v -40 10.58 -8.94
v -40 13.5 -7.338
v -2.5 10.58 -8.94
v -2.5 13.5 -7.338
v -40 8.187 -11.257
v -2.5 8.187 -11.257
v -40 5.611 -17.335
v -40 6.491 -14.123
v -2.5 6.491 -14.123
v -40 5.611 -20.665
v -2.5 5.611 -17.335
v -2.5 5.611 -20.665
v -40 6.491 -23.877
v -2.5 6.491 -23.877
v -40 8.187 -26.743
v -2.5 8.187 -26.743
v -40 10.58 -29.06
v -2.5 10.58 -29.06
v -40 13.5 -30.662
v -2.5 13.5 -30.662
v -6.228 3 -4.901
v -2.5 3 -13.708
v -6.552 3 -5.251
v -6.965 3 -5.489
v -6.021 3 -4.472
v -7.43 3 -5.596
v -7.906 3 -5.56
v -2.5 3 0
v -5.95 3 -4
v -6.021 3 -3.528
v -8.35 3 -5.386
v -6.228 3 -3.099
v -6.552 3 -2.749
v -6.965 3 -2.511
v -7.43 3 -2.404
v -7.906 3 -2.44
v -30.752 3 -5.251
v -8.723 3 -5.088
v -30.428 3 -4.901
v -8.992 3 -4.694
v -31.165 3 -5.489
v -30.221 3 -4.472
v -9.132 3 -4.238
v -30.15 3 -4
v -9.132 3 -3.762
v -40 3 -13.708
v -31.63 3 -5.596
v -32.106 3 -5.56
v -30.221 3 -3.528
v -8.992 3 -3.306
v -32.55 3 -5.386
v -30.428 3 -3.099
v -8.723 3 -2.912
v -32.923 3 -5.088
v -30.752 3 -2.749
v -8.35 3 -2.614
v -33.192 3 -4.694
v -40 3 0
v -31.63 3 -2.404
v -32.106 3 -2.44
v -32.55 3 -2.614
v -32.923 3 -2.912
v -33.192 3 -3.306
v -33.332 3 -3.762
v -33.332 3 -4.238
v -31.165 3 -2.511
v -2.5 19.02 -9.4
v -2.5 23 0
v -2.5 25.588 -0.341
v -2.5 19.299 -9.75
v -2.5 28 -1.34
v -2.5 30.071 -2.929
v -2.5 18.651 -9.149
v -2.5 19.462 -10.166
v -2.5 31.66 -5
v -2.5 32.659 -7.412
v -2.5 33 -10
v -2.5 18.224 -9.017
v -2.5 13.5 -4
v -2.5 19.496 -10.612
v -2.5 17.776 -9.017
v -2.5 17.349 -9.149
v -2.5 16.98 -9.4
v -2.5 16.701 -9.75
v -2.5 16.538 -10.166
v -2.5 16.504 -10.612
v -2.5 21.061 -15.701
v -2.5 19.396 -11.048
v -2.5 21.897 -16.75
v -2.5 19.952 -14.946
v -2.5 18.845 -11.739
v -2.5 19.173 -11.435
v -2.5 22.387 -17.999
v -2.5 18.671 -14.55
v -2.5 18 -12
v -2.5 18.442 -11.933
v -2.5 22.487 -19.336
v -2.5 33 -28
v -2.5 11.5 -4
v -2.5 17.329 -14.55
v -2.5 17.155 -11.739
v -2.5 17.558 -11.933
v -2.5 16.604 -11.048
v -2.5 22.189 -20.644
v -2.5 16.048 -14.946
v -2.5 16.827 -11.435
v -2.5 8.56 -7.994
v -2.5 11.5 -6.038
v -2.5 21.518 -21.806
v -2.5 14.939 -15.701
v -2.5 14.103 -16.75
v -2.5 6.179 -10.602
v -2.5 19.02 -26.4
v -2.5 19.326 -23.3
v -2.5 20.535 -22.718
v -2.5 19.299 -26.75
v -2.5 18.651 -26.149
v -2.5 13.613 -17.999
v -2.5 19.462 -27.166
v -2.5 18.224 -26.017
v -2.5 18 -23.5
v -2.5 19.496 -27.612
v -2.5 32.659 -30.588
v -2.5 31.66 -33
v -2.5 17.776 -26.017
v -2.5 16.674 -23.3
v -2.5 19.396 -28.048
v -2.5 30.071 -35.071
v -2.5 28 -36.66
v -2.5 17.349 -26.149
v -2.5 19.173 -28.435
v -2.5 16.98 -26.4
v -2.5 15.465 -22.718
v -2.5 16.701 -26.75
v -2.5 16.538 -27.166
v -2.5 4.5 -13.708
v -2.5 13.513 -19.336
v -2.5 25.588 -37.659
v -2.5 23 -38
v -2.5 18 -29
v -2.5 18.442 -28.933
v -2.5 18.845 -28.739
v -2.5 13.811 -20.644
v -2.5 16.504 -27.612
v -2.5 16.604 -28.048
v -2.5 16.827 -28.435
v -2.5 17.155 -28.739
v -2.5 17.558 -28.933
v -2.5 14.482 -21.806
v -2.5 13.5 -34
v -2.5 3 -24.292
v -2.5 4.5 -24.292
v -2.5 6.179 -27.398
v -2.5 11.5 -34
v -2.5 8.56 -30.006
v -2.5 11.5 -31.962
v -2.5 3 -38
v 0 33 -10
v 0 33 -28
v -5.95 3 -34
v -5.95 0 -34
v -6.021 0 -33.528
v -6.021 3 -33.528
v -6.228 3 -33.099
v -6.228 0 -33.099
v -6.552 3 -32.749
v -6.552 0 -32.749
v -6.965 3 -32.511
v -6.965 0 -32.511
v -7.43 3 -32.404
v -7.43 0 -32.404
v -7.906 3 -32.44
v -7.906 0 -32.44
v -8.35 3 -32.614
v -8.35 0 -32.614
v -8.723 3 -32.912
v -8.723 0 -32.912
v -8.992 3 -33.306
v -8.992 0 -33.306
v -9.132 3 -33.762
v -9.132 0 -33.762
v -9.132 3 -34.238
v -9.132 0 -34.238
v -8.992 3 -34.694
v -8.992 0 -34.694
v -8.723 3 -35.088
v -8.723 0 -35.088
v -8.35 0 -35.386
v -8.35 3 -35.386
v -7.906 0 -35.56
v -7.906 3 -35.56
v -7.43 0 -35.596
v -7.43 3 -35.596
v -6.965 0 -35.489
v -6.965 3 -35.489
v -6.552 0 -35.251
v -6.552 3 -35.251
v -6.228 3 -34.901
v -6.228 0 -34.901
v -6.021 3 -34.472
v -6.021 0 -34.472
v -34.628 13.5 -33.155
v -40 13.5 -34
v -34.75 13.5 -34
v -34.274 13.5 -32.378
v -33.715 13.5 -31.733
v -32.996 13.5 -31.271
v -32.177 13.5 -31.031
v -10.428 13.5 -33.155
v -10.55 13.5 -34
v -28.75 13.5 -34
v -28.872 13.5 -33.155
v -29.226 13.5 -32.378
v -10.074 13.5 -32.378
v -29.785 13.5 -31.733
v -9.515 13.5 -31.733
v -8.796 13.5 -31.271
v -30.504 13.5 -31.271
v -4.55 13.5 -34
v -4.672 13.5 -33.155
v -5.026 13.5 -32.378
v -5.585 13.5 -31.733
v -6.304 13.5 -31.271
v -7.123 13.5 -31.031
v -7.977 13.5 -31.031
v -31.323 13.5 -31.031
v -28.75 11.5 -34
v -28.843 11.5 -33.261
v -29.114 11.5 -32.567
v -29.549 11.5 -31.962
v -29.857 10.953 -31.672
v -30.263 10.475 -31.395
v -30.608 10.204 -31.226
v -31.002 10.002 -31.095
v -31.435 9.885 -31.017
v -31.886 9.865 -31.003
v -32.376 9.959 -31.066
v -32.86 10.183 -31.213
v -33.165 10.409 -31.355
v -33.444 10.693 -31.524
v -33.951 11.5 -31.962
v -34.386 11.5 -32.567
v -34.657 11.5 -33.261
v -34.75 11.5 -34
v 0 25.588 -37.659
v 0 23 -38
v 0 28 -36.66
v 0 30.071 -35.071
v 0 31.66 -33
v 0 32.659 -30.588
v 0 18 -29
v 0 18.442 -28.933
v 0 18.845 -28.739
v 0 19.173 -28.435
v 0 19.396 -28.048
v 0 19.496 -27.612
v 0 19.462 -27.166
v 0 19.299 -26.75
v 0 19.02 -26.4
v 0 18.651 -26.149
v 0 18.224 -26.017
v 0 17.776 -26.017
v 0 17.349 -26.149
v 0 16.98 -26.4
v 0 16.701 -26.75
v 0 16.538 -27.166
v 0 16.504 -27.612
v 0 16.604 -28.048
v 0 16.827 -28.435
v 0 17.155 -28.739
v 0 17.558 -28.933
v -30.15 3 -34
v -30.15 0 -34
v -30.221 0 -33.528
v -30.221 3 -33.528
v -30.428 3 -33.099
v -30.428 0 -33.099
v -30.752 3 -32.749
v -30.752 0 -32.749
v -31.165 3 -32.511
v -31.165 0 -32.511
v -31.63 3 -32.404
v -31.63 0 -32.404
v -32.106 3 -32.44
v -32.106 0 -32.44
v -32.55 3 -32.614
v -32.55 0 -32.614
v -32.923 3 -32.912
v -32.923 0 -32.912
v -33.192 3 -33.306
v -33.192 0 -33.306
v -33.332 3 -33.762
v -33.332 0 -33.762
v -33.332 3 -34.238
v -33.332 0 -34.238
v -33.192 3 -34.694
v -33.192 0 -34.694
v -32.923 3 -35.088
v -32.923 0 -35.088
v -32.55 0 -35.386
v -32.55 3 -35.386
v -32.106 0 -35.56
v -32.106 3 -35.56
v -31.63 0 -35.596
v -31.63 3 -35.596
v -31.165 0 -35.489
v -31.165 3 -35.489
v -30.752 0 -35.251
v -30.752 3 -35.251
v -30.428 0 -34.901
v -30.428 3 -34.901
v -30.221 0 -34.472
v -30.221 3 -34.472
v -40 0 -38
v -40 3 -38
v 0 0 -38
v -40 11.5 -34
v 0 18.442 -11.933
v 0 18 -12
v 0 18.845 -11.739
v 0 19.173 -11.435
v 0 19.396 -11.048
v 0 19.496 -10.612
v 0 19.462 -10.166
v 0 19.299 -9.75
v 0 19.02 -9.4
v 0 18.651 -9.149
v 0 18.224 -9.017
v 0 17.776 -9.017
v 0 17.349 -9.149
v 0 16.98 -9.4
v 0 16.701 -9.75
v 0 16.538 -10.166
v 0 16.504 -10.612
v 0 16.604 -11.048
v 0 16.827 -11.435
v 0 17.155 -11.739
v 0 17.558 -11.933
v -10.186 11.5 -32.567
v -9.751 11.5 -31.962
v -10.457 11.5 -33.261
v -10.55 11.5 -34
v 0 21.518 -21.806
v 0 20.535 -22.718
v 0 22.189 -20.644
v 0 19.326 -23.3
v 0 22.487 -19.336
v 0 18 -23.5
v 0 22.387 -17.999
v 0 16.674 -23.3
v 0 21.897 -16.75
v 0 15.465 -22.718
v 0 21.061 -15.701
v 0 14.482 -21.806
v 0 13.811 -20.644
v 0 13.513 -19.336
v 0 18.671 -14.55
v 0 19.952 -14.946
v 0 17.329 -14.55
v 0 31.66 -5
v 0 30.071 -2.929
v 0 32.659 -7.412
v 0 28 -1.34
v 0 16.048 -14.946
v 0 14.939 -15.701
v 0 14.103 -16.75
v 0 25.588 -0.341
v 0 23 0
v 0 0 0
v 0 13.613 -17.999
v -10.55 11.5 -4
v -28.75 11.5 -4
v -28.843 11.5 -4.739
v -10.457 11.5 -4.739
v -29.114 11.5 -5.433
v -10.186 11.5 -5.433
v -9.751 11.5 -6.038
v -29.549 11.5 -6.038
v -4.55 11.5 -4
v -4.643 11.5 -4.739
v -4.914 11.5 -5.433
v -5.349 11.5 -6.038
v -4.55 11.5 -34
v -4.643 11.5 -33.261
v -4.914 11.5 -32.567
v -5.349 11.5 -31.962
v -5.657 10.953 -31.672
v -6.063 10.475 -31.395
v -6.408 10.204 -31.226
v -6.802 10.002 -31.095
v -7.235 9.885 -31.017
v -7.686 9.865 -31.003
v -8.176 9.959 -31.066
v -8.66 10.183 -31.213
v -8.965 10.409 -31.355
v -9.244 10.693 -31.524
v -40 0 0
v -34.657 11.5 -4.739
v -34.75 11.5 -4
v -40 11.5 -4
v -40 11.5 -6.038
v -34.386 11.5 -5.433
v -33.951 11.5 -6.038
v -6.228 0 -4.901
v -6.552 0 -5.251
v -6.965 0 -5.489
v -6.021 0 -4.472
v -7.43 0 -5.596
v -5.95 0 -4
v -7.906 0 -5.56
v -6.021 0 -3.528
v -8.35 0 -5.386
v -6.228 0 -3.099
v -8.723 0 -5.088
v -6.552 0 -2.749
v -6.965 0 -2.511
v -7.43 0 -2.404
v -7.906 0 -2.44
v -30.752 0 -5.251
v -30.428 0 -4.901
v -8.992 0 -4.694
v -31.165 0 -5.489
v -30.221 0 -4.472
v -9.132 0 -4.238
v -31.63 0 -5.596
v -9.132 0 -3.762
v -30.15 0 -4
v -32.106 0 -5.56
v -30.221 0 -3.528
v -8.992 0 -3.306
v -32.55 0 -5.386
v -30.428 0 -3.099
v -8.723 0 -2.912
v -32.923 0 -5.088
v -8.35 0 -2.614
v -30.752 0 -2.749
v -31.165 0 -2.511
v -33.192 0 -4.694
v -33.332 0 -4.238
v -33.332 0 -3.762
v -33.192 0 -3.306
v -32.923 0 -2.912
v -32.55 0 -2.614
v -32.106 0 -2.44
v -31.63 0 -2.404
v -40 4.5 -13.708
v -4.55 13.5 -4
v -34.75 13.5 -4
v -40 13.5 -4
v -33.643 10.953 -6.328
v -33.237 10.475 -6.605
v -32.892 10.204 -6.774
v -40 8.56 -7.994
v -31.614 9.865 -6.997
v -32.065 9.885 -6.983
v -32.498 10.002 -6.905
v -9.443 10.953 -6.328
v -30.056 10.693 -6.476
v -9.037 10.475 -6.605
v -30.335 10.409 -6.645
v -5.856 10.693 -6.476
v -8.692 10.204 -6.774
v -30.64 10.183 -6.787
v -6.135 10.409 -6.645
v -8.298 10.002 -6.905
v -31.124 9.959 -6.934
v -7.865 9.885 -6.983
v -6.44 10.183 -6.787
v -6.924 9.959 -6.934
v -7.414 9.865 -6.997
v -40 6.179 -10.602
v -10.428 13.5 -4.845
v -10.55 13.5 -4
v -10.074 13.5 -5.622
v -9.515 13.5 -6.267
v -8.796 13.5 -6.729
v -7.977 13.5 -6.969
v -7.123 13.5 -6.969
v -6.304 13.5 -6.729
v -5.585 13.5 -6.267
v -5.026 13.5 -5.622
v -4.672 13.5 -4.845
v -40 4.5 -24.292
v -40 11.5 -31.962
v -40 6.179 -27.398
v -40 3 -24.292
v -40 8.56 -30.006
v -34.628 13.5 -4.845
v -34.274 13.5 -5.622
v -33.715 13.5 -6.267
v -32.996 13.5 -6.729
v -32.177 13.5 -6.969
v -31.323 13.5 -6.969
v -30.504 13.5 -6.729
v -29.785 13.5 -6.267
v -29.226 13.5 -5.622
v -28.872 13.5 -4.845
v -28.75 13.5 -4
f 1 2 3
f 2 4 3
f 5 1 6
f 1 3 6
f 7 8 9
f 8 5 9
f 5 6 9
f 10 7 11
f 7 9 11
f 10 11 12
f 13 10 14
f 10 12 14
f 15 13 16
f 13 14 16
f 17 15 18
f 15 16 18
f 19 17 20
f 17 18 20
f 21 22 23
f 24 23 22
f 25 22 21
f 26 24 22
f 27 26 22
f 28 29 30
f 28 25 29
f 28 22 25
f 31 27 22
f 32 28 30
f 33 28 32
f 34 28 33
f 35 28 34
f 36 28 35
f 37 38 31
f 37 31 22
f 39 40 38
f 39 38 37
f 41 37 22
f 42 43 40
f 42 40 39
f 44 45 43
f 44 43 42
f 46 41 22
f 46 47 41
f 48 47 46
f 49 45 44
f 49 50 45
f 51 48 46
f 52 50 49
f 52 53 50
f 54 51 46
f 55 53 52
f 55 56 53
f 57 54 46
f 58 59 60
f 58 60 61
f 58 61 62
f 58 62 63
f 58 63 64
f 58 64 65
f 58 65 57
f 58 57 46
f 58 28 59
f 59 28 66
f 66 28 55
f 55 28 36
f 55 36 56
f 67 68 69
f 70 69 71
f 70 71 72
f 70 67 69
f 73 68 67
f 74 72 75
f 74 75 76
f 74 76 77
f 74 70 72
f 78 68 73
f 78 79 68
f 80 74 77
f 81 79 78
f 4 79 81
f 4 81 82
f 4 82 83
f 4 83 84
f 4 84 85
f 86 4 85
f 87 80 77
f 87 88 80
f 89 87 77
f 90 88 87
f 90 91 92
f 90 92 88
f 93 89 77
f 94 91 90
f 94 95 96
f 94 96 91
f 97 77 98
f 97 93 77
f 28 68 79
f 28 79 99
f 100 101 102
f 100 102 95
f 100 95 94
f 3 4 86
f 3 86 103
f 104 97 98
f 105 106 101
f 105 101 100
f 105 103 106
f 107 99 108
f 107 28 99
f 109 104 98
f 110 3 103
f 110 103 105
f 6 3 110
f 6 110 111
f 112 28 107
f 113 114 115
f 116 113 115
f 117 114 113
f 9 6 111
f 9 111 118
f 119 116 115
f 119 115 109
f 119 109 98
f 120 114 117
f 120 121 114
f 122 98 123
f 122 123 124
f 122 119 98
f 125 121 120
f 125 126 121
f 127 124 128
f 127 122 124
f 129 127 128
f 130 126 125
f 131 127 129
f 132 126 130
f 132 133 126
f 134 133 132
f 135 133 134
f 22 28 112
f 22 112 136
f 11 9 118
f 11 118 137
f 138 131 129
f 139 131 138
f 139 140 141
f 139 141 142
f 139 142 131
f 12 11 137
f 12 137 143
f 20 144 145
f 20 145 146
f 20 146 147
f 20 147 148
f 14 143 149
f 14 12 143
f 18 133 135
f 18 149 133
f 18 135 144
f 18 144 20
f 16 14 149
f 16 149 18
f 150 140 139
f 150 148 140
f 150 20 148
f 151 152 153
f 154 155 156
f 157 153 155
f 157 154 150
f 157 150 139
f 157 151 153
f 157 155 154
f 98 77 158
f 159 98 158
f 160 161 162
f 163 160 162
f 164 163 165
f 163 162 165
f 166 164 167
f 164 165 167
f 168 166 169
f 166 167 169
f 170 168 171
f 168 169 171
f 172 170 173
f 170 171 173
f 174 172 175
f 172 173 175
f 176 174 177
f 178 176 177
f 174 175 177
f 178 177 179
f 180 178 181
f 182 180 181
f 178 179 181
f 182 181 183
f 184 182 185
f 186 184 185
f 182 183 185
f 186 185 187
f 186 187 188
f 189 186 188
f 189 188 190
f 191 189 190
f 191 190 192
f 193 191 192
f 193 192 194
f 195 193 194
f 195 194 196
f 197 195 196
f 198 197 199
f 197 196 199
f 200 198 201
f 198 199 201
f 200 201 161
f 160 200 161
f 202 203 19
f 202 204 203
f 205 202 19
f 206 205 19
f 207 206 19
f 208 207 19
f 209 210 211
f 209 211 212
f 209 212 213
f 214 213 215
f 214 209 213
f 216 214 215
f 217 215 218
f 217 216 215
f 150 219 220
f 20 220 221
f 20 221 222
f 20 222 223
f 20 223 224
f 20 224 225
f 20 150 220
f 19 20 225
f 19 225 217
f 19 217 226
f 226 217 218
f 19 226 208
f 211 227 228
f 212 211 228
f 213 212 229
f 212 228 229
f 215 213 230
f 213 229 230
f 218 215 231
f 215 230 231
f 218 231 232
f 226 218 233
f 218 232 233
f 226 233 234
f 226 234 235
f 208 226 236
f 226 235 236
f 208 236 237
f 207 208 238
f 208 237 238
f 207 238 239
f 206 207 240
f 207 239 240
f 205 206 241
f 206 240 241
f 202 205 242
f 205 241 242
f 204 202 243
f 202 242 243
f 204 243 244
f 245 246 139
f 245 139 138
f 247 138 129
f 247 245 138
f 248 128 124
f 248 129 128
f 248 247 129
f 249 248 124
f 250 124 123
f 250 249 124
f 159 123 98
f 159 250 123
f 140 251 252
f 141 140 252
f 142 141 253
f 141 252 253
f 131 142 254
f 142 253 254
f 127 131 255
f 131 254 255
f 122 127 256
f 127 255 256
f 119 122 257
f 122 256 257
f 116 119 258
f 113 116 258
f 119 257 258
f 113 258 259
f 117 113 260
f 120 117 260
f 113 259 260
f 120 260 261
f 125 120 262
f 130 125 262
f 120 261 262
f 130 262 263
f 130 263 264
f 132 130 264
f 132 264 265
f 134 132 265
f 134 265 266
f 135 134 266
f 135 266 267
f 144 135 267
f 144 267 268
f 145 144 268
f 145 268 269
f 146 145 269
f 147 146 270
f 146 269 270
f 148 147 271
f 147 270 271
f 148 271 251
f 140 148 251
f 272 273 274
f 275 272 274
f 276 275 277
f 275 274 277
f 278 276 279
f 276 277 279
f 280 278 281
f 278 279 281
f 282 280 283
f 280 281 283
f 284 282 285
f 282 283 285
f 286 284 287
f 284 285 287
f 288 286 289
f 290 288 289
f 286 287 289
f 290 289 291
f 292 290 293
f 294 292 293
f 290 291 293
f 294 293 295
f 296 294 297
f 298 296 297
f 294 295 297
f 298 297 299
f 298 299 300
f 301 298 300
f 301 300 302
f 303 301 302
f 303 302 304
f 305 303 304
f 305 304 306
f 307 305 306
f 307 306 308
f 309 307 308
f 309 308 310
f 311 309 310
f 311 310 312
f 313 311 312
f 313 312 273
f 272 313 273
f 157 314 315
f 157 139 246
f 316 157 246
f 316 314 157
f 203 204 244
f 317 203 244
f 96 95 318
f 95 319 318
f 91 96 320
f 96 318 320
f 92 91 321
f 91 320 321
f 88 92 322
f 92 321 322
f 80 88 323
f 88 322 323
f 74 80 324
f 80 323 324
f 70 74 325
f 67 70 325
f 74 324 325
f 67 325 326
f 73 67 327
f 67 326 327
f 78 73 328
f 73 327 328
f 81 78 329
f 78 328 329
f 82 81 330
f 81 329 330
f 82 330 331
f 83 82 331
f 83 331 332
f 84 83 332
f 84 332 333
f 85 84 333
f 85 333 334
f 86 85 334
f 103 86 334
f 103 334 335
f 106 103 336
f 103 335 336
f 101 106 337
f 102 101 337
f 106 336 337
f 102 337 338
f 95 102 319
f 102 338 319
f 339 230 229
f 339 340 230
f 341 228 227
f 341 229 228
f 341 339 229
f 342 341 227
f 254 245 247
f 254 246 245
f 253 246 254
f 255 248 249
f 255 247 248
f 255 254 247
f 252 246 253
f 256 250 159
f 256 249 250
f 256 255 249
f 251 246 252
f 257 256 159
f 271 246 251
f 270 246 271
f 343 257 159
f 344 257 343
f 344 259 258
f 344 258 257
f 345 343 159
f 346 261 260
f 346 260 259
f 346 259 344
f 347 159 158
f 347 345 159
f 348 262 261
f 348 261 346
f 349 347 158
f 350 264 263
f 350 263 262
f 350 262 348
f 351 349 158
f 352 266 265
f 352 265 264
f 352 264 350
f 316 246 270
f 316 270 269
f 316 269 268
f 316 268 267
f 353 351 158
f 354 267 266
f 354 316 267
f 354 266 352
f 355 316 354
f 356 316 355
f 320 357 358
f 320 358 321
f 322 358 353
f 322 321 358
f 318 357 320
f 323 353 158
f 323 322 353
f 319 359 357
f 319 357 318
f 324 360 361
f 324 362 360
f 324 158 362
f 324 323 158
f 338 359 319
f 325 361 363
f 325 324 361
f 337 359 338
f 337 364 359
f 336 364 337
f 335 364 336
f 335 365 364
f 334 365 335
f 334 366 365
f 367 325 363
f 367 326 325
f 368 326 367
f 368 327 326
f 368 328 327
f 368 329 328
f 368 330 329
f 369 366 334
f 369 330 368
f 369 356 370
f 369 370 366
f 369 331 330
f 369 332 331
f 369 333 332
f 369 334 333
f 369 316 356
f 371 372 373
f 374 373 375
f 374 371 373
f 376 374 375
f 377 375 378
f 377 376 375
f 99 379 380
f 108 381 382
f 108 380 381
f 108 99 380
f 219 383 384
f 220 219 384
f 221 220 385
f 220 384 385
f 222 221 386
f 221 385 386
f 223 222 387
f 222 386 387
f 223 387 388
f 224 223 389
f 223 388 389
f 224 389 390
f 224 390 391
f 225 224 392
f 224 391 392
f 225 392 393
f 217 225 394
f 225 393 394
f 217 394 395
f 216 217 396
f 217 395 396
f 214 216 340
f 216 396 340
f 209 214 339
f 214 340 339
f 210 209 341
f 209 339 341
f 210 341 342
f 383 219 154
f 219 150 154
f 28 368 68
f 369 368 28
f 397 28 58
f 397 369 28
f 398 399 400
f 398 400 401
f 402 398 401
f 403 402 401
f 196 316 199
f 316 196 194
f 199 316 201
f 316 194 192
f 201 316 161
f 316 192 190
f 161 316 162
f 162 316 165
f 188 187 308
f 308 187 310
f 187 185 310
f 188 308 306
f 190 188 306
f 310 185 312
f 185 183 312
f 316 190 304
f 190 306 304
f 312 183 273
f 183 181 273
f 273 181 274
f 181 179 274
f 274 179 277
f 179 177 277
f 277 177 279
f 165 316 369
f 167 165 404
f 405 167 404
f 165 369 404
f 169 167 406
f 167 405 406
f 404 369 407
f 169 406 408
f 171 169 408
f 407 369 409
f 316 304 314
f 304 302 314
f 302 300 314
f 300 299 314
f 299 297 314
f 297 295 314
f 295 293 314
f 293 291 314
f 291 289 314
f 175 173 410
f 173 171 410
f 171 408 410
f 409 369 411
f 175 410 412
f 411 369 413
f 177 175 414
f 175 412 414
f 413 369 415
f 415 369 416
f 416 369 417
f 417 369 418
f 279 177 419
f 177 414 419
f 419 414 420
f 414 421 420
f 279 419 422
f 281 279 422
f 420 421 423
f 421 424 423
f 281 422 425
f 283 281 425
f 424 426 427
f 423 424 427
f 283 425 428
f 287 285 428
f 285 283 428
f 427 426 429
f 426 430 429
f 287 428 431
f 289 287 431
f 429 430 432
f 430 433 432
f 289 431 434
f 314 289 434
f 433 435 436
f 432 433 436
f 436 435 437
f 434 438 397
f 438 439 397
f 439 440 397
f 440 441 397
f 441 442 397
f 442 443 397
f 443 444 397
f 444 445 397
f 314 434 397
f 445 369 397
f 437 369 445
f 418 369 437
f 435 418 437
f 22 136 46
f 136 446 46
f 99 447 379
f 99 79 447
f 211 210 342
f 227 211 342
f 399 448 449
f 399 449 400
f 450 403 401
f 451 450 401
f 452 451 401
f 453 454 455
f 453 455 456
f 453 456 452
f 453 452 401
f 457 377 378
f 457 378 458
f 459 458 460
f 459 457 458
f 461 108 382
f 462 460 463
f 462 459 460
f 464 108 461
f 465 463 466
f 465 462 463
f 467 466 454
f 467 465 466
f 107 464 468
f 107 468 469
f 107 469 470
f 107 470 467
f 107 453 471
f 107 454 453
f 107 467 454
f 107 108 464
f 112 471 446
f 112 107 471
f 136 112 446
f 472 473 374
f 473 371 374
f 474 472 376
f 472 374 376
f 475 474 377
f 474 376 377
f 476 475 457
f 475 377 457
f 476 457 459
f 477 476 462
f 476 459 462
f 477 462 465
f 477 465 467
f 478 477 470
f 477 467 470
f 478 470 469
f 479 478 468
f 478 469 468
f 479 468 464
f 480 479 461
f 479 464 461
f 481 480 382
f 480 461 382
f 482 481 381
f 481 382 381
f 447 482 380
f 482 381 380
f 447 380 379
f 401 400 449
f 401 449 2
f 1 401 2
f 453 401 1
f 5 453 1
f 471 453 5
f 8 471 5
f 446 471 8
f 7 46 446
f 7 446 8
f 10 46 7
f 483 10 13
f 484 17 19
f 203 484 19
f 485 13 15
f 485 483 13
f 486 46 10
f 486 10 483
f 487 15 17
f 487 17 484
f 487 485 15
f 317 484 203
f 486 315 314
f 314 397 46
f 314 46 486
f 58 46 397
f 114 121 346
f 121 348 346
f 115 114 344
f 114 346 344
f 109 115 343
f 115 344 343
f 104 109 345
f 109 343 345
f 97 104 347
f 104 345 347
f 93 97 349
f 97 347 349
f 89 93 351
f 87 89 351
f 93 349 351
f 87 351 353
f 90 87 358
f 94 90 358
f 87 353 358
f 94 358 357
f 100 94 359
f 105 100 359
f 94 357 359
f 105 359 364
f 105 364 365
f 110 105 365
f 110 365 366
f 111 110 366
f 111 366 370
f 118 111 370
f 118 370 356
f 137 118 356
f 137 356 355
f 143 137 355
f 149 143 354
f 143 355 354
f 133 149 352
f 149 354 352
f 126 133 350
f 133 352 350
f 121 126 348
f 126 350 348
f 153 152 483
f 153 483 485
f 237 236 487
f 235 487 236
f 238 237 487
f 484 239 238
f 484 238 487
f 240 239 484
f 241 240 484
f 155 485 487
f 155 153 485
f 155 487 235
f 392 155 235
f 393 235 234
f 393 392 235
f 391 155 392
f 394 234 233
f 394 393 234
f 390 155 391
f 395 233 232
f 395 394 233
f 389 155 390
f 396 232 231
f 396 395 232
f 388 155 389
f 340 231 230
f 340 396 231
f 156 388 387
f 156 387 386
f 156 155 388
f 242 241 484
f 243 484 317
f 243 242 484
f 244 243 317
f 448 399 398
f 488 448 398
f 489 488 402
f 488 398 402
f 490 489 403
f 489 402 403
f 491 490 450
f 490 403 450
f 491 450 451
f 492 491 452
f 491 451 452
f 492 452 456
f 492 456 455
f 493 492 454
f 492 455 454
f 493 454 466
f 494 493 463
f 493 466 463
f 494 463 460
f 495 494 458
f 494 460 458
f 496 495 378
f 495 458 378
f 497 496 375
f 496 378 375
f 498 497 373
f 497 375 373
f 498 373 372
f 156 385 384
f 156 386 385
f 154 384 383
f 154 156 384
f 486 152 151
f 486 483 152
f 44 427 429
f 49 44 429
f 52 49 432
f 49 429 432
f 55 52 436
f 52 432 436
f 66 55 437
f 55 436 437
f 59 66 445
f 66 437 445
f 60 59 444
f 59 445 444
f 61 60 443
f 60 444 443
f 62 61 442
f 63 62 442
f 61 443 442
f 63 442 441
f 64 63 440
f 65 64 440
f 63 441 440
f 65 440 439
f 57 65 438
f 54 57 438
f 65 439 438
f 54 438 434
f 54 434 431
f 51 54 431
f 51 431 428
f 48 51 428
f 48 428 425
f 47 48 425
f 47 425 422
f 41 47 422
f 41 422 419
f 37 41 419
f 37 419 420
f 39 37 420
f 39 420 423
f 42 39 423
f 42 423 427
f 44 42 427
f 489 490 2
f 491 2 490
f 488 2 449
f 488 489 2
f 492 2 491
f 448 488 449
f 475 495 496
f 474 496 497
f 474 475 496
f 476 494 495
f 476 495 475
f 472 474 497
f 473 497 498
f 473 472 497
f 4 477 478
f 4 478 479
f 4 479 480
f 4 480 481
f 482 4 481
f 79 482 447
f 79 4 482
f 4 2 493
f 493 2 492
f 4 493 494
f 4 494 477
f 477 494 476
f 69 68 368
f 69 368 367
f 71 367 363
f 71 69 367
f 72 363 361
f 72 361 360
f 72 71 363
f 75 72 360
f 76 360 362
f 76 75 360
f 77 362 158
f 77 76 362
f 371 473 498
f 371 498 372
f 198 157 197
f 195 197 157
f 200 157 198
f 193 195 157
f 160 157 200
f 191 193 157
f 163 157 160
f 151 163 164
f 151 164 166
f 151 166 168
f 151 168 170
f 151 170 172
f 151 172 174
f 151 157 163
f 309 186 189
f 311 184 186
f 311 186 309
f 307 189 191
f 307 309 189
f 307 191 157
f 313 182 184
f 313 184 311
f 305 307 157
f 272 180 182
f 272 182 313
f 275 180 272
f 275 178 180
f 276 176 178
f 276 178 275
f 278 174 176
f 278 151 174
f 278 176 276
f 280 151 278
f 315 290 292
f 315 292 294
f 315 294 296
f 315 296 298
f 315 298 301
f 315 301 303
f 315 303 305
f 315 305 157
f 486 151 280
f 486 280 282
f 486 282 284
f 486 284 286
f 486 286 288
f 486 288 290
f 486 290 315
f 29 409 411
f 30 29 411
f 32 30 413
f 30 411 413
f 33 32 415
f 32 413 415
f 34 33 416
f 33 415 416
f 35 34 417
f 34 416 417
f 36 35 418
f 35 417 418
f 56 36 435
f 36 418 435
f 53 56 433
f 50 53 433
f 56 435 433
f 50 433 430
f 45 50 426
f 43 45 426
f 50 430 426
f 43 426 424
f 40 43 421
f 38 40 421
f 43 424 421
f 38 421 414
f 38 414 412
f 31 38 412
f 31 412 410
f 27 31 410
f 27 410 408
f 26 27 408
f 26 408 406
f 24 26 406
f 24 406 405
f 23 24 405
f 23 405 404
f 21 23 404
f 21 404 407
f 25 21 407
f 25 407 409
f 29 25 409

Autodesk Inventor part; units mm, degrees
ref_plane "YZ Plane" through (0, 0, 0) normal (1, 0, 0) x (0, 1, 0)
ref_plane "XZ Plane" through (0, 0, 0) normal (0, 1, 0) x (-1, 0, 0)
ref_plane "XY Plane" through (0, 0, 0) normal (0, 0, 1) x (1, 0, 0)
sketch "Boceto1" plane through (0, 0, 0) normal (0, 1, 0) x (-1, 0, 0)
  point P0 (0, 0)
sketch "Boceto2" plane through (0, 0, 0) normal (0, 1, 0) x (-1, 0, 0)
  line L0 (0, 0) -> (40, 0)
  line L1 (40, 0) -> (40, -38)
  line L2 (40, -38) -> (0, -38)
  line L3 (0, -38) -> (0, 0)
  dimension "d0" = 40
  dimension "d1" = 38
extrude "Extrusión1" add sketch "Boceto2" along normal blind 3
sketch "Boceto3" plane through (0, 3, 0) normal (0, 1, 0) x (1, 0, 0)
  line L0 (0, 0) -> (0, 38) projected
  line L1 (0, 0) -> (-2.5, 0)
  line L2 (-40, 0) -> (0, 0) projected
  line L3 (-2.5, 0) -> (-2.5, 38)
  line L4 (-2.5, 38) -> (0, 38)
  line L5 (0, 38) -> (0, 0)
  dimension "d4" = 2.5
  dimension "d5" = 38
extrude "Extrusión2" add sketch "Boceto3" along normal blind 30
sketch "Boceto4" plane through (0, 0, 0) normal (1, 0, 0) x (0, 0, -1)
  line L0 (0, 0) -> (38, 0) projected
  circle A0 centre (19, 18) radius 4.5
  line L1 (19, 0) -> (19, 18)
  dimension "d9" = 9
  dimension "d21" = 18
extrude "Extrusión3" cut sketch "Boceto4" against normal blind 30
sketch "Boceto5" plane through (0, 0, 0) normal (1, 0, 0) x (0, 0, -1)
  circle A0 centre (19, 18) radius 4.5 projected
  line L0 (19, 18) -> (27.5, 18)
  line L1 (19, 18) -> (10.5, 18)
  circle A1 centre (10.5, 18) radius 1.5
  circle A2 centre (27.5, 18) radius 1.5
  point P0 (0, 0)
  dimension "d12" = 8.5
  dimension "d13" = 8.5
  dimension "d14" = 3
  dimension "d15" = 3
extrude "Extrusión4" cut sketch "Boceto5" against normal blind 8.5 contours A1 | A2
fillet "Empalme1" radius 10 1 edges at (-1.25, 33, 0)
fillet "Empalme2" radius 10 1 edges at (-1.25, 33, -38)
sketch "Boceto6" plane through (-2.5, 3, -38) normal (-1, 0, 0) x (0, 0, 1)
  circle A0 centre (19, 15) radius 4.5 projected
  arc A1 (7.3381, 10.5) -> (30.6619, 10.5) centre (19, 15) ccw
  line L0 (30.6619, 10.5) -> (34, 10.5)
  circle A2 centre (19, 15) radius 4.5 projected
  line L1 (4, 10.5) -> (7.3381, 10.5)
  line L2 (34, 8.5) -> (31.9615, 8.5)
  arc A3 (6.0385, 8.5) -> (31.9615, 8.5) centre (19, 15) ccw
  line L3 (6.0385, 8.5) -> (4, 8.5)
  line L4 (4, 10.5) -> (4, 8.5)
  line L5 (0, 0) -> (0, 20) projected
  line L6 (34, 10.5) -> (34, 8.5)
  line L7 (38, 0) -> (38, 20) projected
  point P0 (38, -3)
  dimension "d20" = 25
  dimension "d27" = 2
extrude "Extrusión5" add sketch "Boceto6" along normal blind 37.5 contours A1 L0 L6 L2 A3 L3 L4 L1
sketch "Boceto9" plane through (0, 0, 0) normal (0, -1, 0) x (1, 0, 0)
  line L0 (0, 0) -> (0, -38) projected
  line L1 (0, -38) -> (0, -19)
  line L2 (0, -19) -> (-7.55, -19)
  line L3 (-7.55, -19) -> (-7.55, -4)
  line L4 (-7.55, -19) -> (-7.55, -34)
  circle A0 centre (-7.55, -4) radius 1.6
  circle A1 centre (-7.55, -34) radius 1.6
  line L5 (-7.55, -4) -> (-31.75, -4)
  line L6 (-2.5, -4) -> (-40, -4) projected
  line L7 (-31.75, -4) -> (-31.75, -34)
  circle A2 centre (-31.75, -4) radius 1.6
  circle A3 centre (-31.75, -34) radius 1.6
  dimension "d33" = 19
  dimension "d34" = 7.55
  dimension "d35" = 15
  dimension "d37" = 15
  dimension "d38" = 3.2
  dimension "d39" = 3.2
  dimension "d41" = 24.2
  dimension "d42" = 30
  dimension "d43" = 3.2
  dimension "d44" = 3.2
extrude "Extrusión6" cut sketch "Boceto9" against normal blind 3
sketch "Boceto10" plane through (0, 3, 0) normal (0, 1, 0) x (1, 0, 0)
  circle A0 centre (-31.75, 4) radius 1.6 projected
  circle A1 centre (-31.75, 4) radius 3
  circle A2 centre (-7.55, 4) radius 1.6 projected
  circle A3 centre (-7.55, 4) radius 3
  circle A4 centre (-31.75, 34) radius 1.6 projected
  circle A5 centre (-31.75, 34) radius 3
  line L0 (-2.5, 34) -> (-40, 34) projected
  circle A6 centre (-7.55, 34) radius 3
  point P0 (0, 0)
  dimension "d58" = 6
  dimension "d59" = 6
  dimension "d60" = 6
  dimension "d61" = 6
extrude "Extrusión7" cut sketch "Boceto10" along normal blind 20 contours A0 | A1 | A2 | A3 | L0 A4 | L0 A5 A4 | A4 L0 A5 | A4 L0 | A6 L0 | L0 A6
sketch "Boceto11" plane through (-40, 0, -38) normal (-1, 0, 0) x (0, 0, 1)
  line L0 (0, 3) -> (38, 3) projected
  arc A0 (6.0385, 11.5) -> (31.9615, 11.5) centre (19, 18) ccw projected
  line L1 (19, 4.5) -> (24.2915, 4.5)
  line L2 (19, 4.5) -> (13.7085, 4.5)
  line L3 (13.7085, 4.5) -> (13.7085, 3)
  line L4 (24.2915, 4.5) -> (24.2915, 3)
  line L5 (13.7085, 3) -> (24.2915, 3)
  point P0 (38, 0)
extrude "Extrusión8" add sketch "Boceto11" against normal blind 40
equation "\"d16\" = d12"
equation "\"Radio_pliegue\" = Grosor"
equation "\"Anchura_desahogo_plegado\" = Grosor"
equation "\"Profundidad_desahogo_plegado\" = 0.5 * Grosor"
equation "\"Tamaño_destalonado\" = 4 * Grosor"
equation "\"Remanente_mínimo\" = 2 * Grosor"
equation "\"Radiodetransición\" = Radio_pliegue"
equation "\"Tamaño_de_radio_de_Jacobi\" = Radio_pliegue"
equation "\"TamañoSeparación\" = Grosor"
equation "\"Grosor\" = 0.5"
properties part number "Base_nueva_3DPrint"
